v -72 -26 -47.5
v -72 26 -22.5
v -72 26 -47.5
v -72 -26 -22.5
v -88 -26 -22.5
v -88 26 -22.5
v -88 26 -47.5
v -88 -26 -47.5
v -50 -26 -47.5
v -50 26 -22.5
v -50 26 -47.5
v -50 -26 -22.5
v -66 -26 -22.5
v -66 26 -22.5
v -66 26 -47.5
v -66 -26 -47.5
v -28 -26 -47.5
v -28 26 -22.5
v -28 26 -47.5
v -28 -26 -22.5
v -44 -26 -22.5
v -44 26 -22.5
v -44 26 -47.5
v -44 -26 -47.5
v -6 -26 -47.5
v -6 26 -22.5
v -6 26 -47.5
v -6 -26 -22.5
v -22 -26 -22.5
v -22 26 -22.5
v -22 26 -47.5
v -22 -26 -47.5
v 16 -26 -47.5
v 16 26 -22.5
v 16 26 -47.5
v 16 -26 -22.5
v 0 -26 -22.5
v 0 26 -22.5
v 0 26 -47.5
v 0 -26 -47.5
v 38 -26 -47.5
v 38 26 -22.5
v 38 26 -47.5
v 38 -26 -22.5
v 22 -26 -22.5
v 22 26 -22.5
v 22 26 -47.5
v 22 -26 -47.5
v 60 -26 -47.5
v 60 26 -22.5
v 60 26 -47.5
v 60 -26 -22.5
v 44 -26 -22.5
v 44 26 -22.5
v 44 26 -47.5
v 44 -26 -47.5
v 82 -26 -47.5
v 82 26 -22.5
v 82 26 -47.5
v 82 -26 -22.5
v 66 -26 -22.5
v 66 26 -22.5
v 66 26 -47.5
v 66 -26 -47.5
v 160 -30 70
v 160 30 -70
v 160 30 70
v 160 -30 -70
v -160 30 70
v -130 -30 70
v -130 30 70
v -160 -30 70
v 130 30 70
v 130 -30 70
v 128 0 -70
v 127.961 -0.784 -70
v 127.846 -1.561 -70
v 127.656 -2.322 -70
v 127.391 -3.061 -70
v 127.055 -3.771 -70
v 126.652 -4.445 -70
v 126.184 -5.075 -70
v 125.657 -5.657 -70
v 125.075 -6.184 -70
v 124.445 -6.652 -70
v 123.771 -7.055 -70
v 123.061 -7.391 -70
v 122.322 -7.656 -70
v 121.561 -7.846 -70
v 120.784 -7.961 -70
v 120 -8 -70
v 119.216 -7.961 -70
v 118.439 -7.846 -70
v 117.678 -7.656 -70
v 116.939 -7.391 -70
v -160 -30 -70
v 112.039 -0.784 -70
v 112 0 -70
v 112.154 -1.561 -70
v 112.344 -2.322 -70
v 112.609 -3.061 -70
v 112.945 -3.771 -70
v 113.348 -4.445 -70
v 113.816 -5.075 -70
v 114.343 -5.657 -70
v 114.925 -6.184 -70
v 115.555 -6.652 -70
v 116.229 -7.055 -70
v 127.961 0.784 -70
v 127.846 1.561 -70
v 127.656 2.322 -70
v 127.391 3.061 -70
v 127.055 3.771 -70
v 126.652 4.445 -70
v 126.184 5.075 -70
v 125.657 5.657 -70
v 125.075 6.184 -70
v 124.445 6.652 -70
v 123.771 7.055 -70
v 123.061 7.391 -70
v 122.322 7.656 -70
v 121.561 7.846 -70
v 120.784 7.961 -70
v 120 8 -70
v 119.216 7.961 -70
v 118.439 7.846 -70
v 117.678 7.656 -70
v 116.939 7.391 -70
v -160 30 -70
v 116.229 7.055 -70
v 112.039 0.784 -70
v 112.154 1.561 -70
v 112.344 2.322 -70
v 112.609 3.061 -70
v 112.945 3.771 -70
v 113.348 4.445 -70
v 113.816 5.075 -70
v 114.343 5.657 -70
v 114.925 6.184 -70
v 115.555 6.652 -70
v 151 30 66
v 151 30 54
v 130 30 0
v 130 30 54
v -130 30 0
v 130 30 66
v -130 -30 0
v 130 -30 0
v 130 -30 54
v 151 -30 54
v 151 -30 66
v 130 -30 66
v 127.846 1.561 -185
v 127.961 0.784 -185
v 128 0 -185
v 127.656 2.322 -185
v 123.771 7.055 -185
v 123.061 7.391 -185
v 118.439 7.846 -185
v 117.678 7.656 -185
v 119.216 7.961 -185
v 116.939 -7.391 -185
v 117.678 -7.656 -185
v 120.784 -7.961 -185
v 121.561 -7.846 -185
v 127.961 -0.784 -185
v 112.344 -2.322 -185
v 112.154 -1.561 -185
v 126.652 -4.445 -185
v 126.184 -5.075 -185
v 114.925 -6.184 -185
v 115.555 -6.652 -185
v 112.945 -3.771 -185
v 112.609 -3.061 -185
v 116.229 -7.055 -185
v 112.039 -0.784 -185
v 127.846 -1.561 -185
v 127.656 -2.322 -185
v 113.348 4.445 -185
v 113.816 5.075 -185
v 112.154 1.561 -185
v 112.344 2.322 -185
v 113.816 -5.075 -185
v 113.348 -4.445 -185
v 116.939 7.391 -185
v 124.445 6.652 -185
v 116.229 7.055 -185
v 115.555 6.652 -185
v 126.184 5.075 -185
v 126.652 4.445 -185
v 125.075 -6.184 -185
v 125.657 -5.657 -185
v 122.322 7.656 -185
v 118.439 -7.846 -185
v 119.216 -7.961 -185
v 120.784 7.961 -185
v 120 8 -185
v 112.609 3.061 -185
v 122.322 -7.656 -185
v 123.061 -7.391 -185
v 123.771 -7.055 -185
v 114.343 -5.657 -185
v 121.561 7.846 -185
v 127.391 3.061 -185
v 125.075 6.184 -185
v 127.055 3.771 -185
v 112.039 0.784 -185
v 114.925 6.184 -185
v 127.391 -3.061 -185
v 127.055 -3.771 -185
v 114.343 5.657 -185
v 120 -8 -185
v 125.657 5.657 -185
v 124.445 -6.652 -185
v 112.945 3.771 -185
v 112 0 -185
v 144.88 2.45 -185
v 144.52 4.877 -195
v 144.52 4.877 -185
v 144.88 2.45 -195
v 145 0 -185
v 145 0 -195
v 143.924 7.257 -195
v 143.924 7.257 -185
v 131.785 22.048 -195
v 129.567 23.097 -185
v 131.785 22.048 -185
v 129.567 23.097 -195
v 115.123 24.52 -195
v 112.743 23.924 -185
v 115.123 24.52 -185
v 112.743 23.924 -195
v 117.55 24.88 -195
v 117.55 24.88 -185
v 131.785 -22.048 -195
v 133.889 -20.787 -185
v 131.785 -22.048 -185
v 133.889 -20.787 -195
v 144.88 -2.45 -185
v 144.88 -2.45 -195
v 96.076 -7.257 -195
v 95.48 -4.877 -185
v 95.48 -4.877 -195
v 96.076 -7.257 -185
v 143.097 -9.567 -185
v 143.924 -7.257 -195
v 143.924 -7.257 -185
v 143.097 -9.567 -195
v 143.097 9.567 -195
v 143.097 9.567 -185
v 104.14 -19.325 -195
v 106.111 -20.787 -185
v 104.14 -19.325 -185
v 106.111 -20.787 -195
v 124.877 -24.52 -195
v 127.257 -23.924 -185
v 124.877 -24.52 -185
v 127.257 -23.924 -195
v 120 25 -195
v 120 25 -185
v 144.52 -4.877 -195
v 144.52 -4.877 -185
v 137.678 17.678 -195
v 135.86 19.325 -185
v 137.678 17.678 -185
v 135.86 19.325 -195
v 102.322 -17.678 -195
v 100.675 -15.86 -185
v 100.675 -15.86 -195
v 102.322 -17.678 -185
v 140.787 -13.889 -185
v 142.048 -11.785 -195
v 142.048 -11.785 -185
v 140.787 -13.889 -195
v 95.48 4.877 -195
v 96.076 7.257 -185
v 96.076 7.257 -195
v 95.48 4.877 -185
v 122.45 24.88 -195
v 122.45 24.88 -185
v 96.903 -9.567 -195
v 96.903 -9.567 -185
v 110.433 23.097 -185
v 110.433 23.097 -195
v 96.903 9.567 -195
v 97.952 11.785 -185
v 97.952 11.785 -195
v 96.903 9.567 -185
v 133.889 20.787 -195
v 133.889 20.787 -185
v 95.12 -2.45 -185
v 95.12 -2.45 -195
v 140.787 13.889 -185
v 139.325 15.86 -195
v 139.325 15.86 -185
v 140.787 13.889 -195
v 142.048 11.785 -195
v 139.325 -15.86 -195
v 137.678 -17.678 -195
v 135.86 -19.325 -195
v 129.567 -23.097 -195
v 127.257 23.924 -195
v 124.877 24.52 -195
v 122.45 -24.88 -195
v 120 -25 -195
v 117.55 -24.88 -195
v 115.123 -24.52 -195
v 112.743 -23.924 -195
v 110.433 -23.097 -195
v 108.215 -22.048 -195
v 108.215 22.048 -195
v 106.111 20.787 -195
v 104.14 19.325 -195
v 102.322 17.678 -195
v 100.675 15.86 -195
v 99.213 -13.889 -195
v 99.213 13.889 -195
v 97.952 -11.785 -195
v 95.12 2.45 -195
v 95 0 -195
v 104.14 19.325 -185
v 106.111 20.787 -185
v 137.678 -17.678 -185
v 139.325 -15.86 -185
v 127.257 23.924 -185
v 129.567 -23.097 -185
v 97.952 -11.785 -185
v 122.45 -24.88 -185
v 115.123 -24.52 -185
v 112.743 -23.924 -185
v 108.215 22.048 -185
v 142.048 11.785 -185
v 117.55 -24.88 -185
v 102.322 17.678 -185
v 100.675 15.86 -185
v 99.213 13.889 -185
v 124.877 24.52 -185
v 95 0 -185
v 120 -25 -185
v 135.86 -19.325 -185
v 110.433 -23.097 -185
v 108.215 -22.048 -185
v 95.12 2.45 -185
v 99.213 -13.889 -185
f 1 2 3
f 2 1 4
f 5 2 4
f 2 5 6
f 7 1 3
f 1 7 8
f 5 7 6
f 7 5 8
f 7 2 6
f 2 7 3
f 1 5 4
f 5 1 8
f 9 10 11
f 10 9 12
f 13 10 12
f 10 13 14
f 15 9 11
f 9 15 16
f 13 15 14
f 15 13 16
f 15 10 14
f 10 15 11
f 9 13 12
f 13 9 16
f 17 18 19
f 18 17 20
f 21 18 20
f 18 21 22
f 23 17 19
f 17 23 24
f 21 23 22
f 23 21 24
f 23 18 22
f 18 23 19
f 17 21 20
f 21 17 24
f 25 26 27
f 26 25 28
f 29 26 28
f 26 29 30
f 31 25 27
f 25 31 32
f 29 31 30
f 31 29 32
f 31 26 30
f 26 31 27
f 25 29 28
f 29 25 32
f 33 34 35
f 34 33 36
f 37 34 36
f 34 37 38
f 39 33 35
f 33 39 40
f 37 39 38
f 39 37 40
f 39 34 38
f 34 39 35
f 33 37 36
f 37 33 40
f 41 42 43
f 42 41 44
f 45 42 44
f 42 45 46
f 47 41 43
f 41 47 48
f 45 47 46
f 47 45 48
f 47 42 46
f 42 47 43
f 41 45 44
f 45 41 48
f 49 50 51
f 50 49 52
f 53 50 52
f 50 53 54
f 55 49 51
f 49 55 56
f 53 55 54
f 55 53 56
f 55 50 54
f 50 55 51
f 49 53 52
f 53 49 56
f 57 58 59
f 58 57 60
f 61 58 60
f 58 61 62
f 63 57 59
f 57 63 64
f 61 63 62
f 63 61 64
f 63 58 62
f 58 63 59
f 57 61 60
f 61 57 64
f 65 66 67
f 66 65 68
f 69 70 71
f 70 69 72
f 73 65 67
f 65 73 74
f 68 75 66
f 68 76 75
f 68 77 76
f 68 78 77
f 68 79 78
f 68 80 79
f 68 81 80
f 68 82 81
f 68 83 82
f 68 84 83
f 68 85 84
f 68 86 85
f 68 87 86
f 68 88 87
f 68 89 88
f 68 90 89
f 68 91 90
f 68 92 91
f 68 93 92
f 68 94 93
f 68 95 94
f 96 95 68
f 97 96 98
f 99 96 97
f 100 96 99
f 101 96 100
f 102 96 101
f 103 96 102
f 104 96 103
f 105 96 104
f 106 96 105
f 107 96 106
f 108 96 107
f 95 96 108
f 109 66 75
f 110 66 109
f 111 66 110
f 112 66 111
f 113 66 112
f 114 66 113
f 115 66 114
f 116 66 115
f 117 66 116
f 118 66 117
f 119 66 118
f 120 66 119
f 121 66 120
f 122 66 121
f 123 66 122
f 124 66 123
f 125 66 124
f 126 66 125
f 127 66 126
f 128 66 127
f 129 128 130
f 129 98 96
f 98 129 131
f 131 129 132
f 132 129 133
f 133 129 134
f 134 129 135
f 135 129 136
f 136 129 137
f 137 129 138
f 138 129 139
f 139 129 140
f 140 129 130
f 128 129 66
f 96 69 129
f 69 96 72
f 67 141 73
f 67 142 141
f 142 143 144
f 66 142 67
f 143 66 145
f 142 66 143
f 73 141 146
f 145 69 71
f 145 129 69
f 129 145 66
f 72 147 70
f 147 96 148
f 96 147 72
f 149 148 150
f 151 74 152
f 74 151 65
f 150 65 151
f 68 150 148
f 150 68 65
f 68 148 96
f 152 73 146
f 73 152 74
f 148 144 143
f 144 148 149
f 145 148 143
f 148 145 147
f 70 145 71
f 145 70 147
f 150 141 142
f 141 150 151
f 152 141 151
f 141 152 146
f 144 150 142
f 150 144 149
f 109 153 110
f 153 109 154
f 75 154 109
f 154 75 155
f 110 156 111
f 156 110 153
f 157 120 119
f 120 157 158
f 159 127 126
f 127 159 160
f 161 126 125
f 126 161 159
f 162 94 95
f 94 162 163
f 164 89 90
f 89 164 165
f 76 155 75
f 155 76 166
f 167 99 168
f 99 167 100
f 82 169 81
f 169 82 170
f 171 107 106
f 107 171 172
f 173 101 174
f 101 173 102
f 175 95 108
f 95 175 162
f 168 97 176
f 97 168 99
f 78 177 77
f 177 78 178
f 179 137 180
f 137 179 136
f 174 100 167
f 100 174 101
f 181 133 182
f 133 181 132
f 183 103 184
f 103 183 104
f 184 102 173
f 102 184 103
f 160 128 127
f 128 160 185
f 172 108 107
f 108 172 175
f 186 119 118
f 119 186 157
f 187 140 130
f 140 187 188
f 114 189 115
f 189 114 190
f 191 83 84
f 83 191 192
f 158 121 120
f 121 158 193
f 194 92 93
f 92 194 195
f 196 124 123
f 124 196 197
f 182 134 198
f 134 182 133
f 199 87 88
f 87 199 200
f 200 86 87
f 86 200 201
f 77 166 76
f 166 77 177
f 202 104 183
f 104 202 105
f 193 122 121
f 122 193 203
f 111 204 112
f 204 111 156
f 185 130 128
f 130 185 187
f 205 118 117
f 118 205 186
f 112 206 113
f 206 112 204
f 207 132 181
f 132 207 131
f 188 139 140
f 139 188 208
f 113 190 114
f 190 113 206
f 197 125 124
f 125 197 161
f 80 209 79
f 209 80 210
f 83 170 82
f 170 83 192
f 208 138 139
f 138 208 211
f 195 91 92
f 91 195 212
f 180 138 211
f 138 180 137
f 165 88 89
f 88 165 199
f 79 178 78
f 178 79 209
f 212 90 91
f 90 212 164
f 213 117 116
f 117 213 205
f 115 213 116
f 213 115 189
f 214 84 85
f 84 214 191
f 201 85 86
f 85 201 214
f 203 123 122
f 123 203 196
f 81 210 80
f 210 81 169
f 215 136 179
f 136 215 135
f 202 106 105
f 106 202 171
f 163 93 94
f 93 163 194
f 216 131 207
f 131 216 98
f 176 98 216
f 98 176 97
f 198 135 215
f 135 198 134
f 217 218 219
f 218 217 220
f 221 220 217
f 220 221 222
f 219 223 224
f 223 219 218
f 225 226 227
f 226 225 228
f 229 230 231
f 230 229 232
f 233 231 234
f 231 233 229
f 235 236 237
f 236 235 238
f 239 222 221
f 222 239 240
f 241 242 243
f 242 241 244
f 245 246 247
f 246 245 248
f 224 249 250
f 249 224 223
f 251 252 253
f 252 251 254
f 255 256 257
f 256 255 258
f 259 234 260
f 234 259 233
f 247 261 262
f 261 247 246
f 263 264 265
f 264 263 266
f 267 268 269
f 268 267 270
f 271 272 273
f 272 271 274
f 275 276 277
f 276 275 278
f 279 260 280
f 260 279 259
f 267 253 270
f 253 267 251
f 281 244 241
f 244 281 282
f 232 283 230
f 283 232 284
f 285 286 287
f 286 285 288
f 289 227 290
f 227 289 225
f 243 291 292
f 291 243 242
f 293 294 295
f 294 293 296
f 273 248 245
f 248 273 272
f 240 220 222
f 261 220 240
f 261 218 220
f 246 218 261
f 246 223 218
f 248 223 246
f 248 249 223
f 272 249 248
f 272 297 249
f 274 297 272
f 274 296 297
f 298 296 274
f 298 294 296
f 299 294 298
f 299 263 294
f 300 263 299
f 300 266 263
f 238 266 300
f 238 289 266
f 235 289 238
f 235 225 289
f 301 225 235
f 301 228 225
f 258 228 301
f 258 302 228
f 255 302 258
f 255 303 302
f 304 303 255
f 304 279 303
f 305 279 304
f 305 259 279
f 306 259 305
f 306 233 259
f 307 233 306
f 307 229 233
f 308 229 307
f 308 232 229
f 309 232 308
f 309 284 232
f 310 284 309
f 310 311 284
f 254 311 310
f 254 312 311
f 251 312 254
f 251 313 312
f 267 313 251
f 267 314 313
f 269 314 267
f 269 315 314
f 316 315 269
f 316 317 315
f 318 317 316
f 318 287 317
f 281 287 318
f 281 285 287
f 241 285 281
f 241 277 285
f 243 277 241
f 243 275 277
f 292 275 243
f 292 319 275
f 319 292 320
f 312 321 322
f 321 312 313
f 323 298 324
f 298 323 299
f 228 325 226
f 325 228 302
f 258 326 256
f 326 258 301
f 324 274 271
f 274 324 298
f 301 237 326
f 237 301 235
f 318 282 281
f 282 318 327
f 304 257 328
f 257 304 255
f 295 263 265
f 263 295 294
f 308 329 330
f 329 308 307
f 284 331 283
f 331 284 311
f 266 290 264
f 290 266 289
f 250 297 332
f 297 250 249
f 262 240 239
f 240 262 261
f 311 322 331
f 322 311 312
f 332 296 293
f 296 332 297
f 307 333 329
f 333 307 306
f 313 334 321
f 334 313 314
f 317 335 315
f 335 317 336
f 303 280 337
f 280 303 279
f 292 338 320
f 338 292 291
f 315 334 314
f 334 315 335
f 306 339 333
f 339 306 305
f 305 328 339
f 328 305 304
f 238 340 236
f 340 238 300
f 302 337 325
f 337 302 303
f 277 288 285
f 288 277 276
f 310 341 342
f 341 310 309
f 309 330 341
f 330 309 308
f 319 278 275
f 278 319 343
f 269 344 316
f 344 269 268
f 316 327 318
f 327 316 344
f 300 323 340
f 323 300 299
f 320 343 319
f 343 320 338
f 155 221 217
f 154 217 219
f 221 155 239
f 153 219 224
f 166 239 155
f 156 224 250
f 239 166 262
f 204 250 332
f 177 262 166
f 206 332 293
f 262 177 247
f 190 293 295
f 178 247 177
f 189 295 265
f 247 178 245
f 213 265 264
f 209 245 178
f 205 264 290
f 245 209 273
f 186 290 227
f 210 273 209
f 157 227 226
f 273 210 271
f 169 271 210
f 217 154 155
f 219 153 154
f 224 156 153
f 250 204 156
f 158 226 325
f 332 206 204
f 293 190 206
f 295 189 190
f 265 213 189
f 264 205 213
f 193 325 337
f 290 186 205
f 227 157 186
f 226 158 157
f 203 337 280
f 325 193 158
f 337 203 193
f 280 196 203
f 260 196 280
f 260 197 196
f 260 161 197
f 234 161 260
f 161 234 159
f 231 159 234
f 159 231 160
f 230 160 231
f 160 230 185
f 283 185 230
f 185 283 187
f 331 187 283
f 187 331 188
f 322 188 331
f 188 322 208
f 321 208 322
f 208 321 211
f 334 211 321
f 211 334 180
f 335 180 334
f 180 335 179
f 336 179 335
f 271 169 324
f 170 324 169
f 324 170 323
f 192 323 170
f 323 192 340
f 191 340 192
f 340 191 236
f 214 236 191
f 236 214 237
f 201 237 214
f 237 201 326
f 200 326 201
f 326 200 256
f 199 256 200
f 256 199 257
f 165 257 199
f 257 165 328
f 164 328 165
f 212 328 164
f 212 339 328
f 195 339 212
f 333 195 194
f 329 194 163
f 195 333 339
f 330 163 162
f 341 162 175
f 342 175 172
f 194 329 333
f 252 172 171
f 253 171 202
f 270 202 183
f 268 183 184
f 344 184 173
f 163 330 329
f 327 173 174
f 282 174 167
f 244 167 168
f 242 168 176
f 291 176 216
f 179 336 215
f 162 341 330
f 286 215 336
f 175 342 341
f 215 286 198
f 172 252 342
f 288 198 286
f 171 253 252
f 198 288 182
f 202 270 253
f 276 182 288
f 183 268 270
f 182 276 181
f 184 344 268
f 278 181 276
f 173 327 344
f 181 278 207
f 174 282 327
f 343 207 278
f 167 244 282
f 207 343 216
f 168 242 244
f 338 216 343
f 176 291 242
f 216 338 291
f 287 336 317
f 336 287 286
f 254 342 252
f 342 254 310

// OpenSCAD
// ============================================================================
// RT Architecture: TUF GPU Chassis with Optoelectronic Isolation Chambers
// ============================================================================

$fn = 64;
variant = "monster"; 

module gpu_optical_chassis(type) {
    length = 320;
    height = 140;
    thickness = (type == "slim") ? 20 : ((type == "server") ? 40 : 60);
    
    // Scale loop chamber quantities based on structural profiles
    loop_chambers = (type == "monster") ? 8 : 4;

    difference() {
        // Main Heavy Armor Shell
        color([0.15, 0.15, 0.15]) 
            cube([length, thickness, height], center=true);
        
        // Main Core Airflow Channel
        translate([0, 0, height/4])
            cube([length - 60, thickness + 2, height/2], center=true);
            
        // Cut out light-tight physical memory loop isolation chambers
        for (i = [0 : loop_chambers - 1]) {
            translate([-length/4 + (i * 22), 0, -height/4]) {
                // Outer light shield enclosure cavity
                cube([16, thickness - 8, 25], center=true);
                
                // Sensor placement slot (Ocean Insight ST-VIS)
                translate([-4, 0, 0]) cylinder(h=25, r=4, center=true);
                
                // LED excitation alignment slot (Bridgelux Thrive 98)
                translate([4, 0, 0]) cylinder(h=25, r=3, center=true);
            }
        }
        
        // Dual M.2 SLI-Snap Bridge Slot Routing
        translate([length/2 - 30, 0, height/2 - 10])
            cube([42, thickness + 5, 12], center=true);
    }

    // Heavy Peg-Leg Support Stand for the 3-Slot Monster to avoid socket stress
    if (type == "monster") {
        color([0.3, 0.3, 0.3]) {
            translate([length/2 - 40, 0, -height/2 - 60]) cylinder(h=120, r=8, center=true);
            translate([length/2 - 40, 0, -height/2 - 120]) cylinder(h=10, r=25, center=true);
        }
    }
}

gpu_optical_chassis(variant);
